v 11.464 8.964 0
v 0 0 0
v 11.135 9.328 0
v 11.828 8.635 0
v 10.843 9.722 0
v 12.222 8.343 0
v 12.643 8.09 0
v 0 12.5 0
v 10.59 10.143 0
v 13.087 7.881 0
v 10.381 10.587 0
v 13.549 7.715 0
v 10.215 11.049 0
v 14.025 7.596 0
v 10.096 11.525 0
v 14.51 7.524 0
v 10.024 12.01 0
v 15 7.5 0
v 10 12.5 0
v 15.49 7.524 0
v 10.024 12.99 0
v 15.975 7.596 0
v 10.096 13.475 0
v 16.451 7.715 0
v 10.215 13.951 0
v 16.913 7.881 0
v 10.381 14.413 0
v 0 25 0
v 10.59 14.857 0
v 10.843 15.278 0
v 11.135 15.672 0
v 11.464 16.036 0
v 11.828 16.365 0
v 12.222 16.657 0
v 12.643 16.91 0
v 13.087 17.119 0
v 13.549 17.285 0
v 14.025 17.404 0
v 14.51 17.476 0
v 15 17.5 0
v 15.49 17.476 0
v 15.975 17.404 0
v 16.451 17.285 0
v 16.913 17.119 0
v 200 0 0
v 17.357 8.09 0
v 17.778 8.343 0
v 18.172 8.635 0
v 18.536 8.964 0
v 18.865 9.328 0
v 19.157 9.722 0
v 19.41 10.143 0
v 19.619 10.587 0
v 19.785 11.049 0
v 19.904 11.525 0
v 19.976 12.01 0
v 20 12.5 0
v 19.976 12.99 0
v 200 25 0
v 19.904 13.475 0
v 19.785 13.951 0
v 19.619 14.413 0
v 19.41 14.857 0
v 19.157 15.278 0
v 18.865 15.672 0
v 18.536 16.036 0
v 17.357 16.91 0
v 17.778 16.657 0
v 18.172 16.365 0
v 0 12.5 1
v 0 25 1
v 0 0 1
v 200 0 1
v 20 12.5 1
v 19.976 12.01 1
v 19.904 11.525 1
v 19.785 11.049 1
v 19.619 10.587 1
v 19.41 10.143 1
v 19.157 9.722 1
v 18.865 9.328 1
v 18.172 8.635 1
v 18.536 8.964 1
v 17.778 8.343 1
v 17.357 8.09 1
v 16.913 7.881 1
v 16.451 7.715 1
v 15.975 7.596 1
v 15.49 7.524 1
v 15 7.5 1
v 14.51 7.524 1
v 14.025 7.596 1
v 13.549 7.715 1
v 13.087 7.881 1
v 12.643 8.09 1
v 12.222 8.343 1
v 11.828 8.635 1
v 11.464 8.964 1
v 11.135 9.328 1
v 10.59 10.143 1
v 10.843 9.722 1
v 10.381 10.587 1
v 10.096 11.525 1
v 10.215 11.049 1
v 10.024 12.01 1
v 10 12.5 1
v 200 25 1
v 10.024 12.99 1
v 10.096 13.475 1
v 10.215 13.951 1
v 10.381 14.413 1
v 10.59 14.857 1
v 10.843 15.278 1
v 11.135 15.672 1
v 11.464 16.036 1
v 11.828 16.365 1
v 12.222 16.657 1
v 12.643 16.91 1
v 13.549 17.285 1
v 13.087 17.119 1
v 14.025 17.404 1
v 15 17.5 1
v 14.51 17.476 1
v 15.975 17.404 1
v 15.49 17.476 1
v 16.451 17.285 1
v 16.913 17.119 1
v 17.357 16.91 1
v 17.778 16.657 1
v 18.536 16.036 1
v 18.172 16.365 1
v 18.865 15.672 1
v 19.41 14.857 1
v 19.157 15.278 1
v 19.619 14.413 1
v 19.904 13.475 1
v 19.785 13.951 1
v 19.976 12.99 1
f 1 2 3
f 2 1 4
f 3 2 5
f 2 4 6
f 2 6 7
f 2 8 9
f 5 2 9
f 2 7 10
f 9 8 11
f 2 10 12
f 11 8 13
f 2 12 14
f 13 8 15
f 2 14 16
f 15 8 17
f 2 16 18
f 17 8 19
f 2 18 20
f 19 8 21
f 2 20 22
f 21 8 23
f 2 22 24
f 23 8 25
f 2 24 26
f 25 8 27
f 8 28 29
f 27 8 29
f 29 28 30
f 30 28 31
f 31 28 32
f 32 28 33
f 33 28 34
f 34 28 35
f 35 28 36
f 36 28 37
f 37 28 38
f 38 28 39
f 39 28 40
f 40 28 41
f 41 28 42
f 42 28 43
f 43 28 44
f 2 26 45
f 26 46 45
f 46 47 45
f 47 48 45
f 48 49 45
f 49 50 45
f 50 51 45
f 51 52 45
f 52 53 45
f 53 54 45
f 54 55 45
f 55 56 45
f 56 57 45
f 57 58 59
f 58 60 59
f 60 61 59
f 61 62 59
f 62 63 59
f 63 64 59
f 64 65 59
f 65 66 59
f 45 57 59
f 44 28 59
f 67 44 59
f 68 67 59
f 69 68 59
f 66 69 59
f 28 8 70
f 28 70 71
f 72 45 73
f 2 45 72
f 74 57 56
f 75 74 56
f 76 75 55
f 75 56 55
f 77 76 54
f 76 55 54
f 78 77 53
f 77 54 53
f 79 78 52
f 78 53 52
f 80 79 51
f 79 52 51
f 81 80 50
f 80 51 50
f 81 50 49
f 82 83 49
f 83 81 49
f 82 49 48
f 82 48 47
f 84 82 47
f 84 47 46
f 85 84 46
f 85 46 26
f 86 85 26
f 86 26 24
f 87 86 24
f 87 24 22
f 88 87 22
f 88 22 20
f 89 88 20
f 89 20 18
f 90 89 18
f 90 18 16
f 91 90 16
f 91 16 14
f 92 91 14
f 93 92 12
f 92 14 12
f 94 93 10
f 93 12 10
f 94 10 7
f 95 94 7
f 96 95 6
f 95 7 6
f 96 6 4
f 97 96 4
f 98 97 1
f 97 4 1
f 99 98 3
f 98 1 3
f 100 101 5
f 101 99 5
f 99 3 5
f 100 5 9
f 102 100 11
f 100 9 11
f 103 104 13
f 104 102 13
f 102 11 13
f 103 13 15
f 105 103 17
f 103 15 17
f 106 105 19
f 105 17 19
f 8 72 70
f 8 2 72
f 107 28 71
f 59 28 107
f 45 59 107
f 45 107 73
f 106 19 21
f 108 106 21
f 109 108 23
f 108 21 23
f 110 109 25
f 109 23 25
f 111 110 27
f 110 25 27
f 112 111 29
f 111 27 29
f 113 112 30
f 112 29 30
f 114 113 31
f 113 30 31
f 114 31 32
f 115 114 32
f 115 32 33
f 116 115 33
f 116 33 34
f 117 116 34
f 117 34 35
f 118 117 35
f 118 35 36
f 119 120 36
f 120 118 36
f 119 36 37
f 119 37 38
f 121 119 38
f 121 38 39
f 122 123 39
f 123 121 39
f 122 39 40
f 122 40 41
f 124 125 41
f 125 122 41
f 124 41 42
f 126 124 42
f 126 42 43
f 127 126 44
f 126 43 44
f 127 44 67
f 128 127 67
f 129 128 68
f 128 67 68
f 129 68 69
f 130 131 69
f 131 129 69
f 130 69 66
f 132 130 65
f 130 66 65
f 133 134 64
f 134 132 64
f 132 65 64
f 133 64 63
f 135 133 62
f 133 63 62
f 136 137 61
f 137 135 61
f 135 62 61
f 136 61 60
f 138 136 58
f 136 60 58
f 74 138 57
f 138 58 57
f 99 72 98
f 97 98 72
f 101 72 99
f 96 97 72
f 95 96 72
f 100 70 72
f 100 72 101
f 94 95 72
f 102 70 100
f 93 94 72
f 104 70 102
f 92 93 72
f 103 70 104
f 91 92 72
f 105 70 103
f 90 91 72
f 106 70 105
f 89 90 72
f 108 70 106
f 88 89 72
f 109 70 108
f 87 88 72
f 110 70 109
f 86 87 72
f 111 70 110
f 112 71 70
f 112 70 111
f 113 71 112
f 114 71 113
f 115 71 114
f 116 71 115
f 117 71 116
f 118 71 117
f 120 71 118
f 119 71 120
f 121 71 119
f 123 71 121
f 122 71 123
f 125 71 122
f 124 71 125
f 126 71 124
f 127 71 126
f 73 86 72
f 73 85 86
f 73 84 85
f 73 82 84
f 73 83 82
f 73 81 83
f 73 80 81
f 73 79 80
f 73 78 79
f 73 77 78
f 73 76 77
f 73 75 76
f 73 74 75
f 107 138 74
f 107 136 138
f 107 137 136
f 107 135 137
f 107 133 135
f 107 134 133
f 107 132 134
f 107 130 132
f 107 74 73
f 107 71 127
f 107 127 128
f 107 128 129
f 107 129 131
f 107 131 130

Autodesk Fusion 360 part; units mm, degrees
sketch "Sketch1" plane through (0, 0, 0) normal (0, 0, 1) x (1, 0, 0)
  line L0 (0, 0) -> (0, 25)
  line L1 (0, 25) -> (200, 25)
  line L2 (200, 25) -> (200, 0)
  line L3 (200, 0) -> (0, 0)
  line L4 (0, 12.5) -> (15, 12.5)
  circle A0 centre (15, 12.5) radius 5
  dimension "d2" = 200
  dimension "d3" = 25
extrude "Extrude1" add sketch "Sketch1" along normal blind 1
